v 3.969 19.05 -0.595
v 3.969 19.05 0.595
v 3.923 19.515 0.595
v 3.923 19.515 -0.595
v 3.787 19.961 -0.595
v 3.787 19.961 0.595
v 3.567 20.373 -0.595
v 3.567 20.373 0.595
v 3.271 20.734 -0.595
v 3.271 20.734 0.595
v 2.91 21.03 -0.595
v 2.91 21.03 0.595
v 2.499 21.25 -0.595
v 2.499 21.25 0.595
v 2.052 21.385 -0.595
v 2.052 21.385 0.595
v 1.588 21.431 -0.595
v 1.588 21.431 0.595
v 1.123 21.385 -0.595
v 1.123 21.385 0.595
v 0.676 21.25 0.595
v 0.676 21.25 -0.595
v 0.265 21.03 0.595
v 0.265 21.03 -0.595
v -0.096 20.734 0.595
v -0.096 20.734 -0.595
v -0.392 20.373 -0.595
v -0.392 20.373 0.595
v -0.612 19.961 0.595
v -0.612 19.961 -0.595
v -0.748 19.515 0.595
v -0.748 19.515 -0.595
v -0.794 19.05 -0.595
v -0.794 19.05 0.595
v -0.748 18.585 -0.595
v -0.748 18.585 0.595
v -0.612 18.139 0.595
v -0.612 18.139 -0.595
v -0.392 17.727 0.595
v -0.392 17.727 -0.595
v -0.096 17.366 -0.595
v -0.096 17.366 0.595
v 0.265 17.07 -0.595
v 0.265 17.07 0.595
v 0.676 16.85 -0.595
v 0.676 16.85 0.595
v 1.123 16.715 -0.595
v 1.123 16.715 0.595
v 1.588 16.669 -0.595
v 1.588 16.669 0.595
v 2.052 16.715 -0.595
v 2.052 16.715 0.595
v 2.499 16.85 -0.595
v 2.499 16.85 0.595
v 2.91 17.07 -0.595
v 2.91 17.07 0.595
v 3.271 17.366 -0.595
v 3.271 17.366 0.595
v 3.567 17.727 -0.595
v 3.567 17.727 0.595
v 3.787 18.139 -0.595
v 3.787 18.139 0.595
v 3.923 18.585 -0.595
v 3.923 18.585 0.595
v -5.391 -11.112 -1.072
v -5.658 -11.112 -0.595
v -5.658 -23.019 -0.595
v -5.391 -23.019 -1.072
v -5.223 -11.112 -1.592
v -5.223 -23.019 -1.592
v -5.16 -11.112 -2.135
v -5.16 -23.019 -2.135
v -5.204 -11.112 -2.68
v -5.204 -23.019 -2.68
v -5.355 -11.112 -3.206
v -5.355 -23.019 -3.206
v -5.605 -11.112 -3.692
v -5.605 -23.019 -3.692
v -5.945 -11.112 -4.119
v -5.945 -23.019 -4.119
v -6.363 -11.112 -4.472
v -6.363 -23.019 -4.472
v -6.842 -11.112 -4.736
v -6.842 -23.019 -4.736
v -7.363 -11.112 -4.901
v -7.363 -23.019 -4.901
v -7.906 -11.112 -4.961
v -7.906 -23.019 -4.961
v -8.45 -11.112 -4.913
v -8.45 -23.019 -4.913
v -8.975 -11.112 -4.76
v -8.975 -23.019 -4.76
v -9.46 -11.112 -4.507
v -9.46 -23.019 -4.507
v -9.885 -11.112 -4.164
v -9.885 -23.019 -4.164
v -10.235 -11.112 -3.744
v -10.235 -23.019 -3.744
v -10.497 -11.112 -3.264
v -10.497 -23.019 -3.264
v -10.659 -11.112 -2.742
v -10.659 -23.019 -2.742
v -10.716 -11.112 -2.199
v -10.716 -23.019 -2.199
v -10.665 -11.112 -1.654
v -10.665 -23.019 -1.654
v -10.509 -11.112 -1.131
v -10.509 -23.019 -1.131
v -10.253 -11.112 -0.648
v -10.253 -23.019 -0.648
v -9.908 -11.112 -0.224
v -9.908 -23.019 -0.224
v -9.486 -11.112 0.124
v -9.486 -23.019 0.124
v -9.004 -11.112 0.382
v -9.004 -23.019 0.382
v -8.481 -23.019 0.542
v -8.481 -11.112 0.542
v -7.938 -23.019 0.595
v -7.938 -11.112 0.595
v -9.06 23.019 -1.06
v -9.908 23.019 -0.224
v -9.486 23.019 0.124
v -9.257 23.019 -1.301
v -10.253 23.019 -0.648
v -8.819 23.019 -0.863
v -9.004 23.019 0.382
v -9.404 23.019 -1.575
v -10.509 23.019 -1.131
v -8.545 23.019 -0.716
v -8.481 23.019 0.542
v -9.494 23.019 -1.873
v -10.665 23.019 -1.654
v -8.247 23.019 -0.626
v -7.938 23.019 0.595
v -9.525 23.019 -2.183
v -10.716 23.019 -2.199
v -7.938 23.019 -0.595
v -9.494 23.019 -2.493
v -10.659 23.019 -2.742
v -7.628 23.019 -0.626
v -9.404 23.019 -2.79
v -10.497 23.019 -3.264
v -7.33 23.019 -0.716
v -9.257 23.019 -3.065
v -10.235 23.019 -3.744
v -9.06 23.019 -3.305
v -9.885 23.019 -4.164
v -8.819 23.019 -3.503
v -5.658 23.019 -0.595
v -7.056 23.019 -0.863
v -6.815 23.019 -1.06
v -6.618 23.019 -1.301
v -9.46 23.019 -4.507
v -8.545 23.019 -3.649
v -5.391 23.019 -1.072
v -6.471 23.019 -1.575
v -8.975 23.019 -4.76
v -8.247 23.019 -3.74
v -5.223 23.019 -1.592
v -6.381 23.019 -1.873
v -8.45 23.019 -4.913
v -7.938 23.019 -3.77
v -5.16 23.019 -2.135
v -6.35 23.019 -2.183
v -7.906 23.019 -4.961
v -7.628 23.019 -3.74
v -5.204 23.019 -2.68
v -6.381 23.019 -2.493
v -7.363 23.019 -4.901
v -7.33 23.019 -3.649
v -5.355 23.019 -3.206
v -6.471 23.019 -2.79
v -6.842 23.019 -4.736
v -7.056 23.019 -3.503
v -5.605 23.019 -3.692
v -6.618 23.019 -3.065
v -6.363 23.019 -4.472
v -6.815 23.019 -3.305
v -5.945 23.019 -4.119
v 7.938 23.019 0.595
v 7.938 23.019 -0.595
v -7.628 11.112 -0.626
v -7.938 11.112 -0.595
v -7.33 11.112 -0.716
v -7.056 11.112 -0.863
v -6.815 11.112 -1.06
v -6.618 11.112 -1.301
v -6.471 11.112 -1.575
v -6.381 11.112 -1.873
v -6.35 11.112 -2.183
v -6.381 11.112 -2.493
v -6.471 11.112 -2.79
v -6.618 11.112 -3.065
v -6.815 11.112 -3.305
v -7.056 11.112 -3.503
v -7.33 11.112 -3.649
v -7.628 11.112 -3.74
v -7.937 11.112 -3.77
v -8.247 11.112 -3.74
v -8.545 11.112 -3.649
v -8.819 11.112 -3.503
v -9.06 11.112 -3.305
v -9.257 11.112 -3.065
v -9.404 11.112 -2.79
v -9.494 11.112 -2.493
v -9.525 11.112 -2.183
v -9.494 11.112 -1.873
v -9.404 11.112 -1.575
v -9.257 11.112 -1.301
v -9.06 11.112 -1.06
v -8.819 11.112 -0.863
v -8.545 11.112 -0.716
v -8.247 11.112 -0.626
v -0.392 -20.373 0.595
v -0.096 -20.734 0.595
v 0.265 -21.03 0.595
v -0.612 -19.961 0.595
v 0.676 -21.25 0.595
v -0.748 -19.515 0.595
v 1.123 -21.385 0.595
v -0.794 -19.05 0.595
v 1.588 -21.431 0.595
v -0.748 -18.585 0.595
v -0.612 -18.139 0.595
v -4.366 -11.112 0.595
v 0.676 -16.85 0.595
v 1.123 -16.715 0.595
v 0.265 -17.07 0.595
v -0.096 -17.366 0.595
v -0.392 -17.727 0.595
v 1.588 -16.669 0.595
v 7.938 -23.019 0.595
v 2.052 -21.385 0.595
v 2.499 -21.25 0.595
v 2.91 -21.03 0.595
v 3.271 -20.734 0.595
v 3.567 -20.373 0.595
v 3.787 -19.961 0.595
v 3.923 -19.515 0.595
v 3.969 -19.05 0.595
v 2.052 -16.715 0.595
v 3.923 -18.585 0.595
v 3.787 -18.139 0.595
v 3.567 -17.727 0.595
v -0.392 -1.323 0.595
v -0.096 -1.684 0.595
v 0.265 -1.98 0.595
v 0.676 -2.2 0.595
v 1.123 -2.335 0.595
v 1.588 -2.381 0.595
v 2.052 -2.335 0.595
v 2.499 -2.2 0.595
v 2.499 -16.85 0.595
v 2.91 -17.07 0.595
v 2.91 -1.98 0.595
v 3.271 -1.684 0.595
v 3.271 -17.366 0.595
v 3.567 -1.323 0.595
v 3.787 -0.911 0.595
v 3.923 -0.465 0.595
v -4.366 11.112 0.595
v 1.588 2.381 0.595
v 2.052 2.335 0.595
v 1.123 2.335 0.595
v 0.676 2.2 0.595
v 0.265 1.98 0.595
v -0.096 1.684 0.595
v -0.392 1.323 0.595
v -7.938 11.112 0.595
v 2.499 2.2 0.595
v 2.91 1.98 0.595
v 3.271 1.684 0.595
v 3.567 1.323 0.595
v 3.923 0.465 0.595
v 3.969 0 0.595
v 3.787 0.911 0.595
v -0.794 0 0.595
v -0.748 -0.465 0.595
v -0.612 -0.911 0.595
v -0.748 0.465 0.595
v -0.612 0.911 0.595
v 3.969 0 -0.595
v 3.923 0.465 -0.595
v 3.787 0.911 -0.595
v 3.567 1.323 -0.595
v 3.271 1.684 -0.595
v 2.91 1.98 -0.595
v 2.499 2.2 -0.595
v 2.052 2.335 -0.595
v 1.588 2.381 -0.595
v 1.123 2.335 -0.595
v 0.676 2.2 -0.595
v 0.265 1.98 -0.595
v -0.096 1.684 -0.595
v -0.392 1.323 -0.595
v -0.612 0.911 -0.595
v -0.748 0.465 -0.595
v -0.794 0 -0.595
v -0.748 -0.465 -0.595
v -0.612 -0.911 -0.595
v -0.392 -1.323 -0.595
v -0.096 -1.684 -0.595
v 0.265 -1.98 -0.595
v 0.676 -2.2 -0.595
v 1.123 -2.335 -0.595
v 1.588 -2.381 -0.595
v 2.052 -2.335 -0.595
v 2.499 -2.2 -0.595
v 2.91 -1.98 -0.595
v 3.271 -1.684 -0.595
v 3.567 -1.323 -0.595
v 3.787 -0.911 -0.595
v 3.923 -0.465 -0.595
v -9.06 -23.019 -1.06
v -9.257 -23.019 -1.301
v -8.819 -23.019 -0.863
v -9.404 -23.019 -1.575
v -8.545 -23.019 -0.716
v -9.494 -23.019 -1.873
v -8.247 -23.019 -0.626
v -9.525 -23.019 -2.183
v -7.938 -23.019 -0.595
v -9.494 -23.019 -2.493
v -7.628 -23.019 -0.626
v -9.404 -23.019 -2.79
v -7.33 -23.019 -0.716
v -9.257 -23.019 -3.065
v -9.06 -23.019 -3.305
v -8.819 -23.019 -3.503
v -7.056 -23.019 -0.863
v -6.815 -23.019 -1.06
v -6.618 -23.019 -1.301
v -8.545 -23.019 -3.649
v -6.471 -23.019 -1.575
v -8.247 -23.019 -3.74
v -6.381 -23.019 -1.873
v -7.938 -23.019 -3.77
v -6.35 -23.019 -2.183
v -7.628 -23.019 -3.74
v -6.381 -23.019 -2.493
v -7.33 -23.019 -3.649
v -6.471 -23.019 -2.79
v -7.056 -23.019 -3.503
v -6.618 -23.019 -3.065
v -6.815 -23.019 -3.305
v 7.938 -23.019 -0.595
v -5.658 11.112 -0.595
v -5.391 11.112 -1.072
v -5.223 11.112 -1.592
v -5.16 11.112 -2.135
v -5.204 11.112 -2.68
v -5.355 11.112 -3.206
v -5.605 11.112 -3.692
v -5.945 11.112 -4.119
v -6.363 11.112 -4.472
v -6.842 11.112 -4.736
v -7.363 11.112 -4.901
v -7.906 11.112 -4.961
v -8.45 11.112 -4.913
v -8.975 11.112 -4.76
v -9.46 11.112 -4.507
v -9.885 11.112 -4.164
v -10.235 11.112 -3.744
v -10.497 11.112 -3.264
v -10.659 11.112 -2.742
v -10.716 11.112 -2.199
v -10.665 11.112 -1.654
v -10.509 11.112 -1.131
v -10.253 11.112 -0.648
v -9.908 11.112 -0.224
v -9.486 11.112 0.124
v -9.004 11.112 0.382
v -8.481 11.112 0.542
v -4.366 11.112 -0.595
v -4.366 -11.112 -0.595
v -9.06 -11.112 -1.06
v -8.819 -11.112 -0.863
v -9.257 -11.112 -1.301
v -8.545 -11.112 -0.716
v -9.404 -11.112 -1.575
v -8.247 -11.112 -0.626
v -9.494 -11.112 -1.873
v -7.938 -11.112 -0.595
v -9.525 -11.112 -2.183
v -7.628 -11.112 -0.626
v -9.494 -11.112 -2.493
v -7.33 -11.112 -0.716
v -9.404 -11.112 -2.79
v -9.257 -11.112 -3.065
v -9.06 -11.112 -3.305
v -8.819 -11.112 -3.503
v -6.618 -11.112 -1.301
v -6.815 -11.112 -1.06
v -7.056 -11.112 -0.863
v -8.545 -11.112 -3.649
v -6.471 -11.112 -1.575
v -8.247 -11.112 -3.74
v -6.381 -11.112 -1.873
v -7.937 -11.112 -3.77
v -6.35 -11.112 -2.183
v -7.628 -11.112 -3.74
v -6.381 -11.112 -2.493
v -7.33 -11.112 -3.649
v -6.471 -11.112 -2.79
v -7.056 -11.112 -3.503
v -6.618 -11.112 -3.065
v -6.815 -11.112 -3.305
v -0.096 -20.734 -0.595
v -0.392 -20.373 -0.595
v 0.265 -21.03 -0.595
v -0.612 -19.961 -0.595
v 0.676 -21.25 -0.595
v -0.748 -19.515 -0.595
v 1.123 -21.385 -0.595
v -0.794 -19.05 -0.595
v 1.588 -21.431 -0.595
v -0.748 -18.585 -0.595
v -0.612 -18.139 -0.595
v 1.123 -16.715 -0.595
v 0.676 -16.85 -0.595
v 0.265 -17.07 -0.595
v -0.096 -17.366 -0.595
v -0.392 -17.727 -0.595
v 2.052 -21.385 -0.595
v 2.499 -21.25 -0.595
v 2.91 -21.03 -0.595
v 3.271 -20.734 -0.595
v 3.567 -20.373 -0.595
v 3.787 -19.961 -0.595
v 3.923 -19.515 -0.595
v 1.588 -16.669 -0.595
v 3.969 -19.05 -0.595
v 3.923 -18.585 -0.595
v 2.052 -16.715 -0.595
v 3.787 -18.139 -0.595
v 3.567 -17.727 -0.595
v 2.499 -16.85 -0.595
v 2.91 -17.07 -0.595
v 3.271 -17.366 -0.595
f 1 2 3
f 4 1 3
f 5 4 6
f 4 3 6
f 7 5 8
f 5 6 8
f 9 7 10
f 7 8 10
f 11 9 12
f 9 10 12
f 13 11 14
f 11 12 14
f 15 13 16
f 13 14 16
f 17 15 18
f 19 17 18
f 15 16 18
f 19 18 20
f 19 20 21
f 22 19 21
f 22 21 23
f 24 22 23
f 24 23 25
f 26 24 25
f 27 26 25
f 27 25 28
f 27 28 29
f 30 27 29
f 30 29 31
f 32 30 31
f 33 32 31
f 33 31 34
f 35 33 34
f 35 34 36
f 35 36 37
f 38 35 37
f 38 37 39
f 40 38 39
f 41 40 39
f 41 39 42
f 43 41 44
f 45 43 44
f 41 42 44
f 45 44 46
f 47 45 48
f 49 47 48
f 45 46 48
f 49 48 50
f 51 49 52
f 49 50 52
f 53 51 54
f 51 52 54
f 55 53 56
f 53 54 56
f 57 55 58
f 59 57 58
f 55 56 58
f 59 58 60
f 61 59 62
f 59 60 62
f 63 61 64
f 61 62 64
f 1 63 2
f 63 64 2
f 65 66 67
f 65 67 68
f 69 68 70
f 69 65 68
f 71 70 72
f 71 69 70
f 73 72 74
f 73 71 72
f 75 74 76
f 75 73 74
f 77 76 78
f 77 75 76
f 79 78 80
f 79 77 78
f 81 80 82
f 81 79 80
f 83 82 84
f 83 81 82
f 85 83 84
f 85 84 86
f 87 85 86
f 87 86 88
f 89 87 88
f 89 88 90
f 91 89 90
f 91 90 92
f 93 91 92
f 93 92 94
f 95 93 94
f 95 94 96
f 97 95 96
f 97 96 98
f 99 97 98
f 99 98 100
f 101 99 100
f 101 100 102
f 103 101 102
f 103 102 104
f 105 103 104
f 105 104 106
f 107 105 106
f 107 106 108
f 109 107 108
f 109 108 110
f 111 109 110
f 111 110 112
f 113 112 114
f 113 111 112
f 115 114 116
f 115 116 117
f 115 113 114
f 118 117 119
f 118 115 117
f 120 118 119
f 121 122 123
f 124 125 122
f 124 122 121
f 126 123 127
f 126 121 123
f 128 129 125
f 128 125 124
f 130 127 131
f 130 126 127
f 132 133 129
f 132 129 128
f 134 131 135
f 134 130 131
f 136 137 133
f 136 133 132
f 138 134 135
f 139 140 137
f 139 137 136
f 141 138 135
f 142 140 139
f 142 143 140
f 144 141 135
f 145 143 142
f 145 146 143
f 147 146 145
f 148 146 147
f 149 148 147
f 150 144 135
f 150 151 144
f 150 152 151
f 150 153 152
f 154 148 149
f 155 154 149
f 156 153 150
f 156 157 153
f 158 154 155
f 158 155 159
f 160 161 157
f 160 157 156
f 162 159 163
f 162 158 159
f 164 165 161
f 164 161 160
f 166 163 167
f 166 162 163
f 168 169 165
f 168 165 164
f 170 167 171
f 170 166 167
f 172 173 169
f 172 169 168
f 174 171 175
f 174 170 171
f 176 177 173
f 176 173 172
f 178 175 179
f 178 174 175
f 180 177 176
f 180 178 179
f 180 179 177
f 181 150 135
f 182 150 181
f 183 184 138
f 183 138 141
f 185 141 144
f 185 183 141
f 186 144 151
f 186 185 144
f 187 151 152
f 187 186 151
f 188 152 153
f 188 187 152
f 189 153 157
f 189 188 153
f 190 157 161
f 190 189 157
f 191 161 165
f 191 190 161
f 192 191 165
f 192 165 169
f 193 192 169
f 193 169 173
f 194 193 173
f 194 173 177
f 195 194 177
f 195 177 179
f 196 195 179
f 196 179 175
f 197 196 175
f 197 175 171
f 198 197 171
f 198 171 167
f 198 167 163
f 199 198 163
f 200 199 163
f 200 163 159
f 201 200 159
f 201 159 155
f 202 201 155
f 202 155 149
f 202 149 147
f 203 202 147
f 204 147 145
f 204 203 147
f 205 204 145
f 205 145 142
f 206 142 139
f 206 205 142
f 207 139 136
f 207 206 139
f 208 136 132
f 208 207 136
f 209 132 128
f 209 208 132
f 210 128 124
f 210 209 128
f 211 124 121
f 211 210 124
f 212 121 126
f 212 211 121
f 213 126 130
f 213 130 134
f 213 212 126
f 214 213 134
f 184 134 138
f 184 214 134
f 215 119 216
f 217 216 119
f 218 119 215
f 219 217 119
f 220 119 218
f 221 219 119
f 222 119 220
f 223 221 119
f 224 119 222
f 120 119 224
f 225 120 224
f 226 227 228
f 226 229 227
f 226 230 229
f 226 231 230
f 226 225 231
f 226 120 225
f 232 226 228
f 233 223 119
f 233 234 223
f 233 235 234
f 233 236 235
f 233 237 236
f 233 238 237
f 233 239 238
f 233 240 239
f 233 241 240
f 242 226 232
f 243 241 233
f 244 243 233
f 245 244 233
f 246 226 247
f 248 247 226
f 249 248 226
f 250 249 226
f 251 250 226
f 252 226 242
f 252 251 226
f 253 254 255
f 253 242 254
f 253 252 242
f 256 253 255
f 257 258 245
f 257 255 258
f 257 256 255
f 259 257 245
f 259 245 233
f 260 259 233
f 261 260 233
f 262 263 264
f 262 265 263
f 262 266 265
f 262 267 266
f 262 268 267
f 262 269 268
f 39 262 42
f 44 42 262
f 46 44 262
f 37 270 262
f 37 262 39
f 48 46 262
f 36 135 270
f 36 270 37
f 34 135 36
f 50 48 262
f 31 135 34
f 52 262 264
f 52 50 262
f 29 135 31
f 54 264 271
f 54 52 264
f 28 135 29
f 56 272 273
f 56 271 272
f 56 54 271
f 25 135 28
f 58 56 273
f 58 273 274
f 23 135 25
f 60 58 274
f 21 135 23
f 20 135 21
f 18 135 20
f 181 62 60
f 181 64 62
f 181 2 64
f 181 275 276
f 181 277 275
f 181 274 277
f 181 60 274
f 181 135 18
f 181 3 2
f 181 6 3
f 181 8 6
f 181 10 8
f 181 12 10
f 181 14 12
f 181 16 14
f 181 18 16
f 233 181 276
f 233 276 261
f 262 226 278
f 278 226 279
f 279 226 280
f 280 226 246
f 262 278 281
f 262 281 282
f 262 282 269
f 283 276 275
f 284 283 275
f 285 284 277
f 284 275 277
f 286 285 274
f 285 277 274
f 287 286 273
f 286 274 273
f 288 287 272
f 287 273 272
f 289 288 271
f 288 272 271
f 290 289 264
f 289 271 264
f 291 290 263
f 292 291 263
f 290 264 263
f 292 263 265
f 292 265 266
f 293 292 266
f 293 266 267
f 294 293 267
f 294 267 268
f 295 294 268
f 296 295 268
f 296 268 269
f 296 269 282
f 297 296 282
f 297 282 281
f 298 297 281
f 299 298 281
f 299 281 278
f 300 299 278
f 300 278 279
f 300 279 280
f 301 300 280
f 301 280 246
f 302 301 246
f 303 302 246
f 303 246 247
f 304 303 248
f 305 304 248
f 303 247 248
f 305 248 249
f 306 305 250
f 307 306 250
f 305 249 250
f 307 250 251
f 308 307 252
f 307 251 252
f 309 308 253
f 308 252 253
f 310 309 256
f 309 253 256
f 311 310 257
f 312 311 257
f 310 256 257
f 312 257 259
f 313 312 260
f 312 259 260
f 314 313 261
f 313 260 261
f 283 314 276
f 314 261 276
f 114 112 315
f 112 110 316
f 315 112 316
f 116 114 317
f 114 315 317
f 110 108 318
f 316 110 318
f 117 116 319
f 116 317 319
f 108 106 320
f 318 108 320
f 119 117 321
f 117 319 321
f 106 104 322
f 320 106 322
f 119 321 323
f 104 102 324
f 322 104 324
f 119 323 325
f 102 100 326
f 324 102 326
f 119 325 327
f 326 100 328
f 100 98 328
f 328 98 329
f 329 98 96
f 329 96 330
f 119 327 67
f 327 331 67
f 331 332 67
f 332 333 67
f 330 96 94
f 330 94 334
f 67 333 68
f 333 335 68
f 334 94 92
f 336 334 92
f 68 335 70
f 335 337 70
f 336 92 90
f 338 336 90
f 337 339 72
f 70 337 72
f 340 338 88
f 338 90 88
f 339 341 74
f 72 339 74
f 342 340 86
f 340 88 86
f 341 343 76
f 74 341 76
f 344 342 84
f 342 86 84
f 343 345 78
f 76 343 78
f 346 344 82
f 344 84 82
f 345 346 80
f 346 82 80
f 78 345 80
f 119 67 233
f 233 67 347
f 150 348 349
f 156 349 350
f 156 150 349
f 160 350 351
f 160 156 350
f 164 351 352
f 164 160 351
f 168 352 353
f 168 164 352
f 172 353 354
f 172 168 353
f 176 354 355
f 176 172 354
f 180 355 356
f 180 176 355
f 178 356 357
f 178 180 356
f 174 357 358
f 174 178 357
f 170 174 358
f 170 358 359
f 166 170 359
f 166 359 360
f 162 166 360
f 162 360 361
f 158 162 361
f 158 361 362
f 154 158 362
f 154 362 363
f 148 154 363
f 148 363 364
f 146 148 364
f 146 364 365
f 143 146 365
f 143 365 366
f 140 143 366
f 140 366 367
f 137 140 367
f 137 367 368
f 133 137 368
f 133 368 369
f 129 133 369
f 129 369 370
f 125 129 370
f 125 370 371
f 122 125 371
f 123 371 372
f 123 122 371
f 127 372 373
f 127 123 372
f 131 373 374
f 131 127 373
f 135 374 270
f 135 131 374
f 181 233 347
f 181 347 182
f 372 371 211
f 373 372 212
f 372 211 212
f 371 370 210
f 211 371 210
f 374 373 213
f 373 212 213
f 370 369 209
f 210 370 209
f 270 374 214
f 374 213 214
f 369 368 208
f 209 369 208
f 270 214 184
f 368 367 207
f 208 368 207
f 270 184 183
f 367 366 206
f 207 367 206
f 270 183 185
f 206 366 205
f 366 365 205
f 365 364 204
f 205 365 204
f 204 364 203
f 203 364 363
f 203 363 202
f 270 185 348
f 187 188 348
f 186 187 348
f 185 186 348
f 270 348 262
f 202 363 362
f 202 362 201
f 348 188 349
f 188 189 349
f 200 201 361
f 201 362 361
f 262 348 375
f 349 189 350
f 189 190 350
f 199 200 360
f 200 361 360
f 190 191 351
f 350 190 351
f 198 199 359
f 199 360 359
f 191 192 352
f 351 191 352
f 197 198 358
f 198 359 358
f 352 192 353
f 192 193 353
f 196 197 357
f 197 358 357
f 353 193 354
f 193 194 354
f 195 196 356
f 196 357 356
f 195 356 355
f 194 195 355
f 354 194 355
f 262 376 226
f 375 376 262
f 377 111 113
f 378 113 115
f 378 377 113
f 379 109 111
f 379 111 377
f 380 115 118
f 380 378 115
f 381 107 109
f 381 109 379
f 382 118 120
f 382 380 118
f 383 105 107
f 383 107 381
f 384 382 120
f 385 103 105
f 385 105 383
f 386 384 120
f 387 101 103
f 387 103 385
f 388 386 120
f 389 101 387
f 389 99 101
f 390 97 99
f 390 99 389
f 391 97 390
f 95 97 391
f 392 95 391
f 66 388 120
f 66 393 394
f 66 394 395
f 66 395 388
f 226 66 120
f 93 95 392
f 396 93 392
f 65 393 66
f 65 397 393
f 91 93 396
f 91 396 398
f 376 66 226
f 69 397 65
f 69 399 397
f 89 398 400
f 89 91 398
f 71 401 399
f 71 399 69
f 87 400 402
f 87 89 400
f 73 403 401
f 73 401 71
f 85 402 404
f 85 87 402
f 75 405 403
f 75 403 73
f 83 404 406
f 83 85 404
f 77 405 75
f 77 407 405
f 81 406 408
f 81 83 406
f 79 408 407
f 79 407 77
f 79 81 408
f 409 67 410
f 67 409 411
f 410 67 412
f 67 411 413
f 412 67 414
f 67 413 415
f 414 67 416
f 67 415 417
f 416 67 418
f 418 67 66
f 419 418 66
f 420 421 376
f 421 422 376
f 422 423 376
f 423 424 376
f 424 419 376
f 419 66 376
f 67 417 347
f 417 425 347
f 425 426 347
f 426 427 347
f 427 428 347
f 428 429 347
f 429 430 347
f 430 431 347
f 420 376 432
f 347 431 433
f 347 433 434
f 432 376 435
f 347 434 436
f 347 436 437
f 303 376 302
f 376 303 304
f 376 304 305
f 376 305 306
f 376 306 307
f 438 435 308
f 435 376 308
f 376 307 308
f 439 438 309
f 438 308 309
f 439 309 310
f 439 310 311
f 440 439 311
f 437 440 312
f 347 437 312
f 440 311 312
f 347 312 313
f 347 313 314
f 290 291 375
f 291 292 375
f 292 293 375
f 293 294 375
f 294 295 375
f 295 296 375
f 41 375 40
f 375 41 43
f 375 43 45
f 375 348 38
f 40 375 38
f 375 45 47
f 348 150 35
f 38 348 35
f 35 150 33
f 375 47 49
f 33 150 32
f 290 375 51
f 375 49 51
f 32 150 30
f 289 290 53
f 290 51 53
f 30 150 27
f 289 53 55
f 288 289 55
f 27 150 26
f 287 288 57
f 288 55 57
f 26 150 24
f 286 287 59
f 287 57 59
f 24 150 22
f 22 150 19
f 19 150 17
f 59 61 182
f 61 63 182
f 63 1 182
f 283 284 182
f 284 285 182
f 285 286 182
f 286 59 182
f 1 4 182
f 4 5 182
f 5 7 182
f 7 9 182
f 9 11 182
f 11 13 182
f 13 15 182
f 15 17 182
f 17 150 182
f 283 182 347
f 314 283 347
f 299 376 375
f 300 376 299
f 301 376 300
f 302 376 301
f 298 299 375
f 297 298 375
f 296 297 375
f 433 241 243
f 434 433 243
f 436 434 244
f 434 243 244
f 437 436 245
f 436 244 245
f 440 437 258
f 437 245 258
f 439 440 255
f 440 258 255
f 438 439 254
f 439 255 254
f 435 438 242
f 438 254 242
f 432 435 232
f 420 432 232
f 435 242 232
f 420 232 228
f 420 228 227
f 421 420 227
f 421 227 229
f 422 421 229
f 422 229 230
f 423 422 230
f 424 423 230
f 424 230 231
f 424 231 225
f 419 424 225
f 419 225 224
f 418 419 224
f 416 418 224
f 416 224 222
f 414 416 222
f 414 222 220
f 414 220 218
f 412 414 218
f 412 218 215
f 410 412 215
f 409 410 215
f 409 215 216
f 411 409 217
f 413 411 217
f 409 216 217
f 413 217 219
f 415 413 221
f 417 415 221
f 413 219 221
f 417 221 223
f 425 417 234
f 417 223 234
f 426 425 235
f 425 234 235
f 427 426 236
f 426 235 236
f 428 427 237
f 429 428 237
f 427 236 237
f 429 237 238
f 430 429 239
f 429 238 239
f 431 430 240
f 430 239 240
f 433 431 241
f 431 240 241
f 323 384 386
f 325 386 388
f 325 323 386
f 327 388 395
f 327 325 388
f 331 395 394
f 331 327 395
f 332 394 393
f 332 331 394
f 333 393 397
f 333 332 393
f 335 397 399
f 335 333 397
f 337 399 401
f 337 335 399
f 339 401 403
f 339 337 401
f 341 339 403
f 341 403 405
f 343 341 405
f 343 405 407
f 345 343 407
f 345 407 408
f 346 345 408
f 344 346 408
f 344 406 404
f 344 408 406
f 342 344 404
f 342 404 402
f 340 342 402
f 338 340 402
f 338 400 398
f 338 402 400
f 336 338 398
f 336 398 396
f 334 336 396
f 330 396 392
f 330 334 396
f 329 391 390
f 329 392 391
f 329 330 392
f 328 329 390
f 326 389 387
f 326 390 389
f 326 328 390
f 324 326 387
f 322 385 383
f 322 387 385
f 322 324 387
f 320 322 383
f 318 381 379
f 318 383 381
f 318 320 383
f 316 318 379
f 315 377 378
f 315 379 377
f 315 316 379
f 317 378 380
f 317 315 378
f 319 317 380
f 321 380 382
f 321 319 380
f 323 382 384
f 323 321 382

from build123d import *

# Parameters (mm, degrees)
SKETCH1_W                      = 15.875
SKETCH1_H                      = 46.0375
BOSS_EXTRUDE1_DEPTH            = 0.5953125
SKETCH2_R                      = 2.778125
SKETCH2_R_2                    = 1.5875
BOSS_EXTRUDE2_DEPTH            = 23.01875
CUT_EXTRUDE1_DEPTH             = 26.870801526
CUT_EXTRUDE1_DEPTH_BACK        = 26.870801526
SKETCH3_W                      = 6.35
SKETCH3_H                      = 22.225
F_3_16_0_1875_DIAMETER_HOLE1_D = 4.7625


with BuildPart() as part:
    # Sketch1 → Boss-Extrude1 (new, symmetric)
    with BuildSketch(Plane.XY):
        Rectangle(SKETCH1_W, SKETCH1_H)
    extrude(amount=BOSS_EXTRUDE1_DEPTH, both=True)

    # Sketch2 → Boss-Extrude2 (add, symmetric)
    with BuildSketch(Plane(origin=(0, 0, 0), x_dir=(1, 0, 0), z_dir=(0, 1, 0))):
        with Locations((-7.9375, 2.1828125)):
            Circle(SKETCH2_R)
        with Locations(Location((-7.9375, 2.1828125, 0), (0, 0, 270))):
            Circle(SKETCH2_R_2, mode=Mode.SUBTRACT)
    extrude(amount=BOSS_EXTRUDE2_DEPTH, both=True)

    # Sketch3 → Cut-Extrude1 (cut, two sides: drawn at the far end of the back side and taken through both)
    with BuildSketch(Plane.XY.offset(-CUT_EXTRUDE1_DEPTH_BACK)):
        with Locations((-7.540625, 0)):
            Rectangle(SKETCH3_W, SKETCH3_H)
    extrude(amount=CUT_EXTRUDE1_DEPTH + CUT_EXTRUDE1_DEPTH_BACK, mode=Mode.SUBTRACT)

    # 3/16 (0.1875) Diameter Hole1 (through all)
    with Locations(Plane(origin=(0, 0, -0.5953125), x_dir=(-1, 0, 0), z_dir=(0, 0, -1))):
        with Locations((-1.5875, -19.05), (-1.5875, 0), (-1.5875, 19.05)):
            Hole(F_3_16_0_1875_DIAMETER_HOLE1_D / 2)


solid = part.part
